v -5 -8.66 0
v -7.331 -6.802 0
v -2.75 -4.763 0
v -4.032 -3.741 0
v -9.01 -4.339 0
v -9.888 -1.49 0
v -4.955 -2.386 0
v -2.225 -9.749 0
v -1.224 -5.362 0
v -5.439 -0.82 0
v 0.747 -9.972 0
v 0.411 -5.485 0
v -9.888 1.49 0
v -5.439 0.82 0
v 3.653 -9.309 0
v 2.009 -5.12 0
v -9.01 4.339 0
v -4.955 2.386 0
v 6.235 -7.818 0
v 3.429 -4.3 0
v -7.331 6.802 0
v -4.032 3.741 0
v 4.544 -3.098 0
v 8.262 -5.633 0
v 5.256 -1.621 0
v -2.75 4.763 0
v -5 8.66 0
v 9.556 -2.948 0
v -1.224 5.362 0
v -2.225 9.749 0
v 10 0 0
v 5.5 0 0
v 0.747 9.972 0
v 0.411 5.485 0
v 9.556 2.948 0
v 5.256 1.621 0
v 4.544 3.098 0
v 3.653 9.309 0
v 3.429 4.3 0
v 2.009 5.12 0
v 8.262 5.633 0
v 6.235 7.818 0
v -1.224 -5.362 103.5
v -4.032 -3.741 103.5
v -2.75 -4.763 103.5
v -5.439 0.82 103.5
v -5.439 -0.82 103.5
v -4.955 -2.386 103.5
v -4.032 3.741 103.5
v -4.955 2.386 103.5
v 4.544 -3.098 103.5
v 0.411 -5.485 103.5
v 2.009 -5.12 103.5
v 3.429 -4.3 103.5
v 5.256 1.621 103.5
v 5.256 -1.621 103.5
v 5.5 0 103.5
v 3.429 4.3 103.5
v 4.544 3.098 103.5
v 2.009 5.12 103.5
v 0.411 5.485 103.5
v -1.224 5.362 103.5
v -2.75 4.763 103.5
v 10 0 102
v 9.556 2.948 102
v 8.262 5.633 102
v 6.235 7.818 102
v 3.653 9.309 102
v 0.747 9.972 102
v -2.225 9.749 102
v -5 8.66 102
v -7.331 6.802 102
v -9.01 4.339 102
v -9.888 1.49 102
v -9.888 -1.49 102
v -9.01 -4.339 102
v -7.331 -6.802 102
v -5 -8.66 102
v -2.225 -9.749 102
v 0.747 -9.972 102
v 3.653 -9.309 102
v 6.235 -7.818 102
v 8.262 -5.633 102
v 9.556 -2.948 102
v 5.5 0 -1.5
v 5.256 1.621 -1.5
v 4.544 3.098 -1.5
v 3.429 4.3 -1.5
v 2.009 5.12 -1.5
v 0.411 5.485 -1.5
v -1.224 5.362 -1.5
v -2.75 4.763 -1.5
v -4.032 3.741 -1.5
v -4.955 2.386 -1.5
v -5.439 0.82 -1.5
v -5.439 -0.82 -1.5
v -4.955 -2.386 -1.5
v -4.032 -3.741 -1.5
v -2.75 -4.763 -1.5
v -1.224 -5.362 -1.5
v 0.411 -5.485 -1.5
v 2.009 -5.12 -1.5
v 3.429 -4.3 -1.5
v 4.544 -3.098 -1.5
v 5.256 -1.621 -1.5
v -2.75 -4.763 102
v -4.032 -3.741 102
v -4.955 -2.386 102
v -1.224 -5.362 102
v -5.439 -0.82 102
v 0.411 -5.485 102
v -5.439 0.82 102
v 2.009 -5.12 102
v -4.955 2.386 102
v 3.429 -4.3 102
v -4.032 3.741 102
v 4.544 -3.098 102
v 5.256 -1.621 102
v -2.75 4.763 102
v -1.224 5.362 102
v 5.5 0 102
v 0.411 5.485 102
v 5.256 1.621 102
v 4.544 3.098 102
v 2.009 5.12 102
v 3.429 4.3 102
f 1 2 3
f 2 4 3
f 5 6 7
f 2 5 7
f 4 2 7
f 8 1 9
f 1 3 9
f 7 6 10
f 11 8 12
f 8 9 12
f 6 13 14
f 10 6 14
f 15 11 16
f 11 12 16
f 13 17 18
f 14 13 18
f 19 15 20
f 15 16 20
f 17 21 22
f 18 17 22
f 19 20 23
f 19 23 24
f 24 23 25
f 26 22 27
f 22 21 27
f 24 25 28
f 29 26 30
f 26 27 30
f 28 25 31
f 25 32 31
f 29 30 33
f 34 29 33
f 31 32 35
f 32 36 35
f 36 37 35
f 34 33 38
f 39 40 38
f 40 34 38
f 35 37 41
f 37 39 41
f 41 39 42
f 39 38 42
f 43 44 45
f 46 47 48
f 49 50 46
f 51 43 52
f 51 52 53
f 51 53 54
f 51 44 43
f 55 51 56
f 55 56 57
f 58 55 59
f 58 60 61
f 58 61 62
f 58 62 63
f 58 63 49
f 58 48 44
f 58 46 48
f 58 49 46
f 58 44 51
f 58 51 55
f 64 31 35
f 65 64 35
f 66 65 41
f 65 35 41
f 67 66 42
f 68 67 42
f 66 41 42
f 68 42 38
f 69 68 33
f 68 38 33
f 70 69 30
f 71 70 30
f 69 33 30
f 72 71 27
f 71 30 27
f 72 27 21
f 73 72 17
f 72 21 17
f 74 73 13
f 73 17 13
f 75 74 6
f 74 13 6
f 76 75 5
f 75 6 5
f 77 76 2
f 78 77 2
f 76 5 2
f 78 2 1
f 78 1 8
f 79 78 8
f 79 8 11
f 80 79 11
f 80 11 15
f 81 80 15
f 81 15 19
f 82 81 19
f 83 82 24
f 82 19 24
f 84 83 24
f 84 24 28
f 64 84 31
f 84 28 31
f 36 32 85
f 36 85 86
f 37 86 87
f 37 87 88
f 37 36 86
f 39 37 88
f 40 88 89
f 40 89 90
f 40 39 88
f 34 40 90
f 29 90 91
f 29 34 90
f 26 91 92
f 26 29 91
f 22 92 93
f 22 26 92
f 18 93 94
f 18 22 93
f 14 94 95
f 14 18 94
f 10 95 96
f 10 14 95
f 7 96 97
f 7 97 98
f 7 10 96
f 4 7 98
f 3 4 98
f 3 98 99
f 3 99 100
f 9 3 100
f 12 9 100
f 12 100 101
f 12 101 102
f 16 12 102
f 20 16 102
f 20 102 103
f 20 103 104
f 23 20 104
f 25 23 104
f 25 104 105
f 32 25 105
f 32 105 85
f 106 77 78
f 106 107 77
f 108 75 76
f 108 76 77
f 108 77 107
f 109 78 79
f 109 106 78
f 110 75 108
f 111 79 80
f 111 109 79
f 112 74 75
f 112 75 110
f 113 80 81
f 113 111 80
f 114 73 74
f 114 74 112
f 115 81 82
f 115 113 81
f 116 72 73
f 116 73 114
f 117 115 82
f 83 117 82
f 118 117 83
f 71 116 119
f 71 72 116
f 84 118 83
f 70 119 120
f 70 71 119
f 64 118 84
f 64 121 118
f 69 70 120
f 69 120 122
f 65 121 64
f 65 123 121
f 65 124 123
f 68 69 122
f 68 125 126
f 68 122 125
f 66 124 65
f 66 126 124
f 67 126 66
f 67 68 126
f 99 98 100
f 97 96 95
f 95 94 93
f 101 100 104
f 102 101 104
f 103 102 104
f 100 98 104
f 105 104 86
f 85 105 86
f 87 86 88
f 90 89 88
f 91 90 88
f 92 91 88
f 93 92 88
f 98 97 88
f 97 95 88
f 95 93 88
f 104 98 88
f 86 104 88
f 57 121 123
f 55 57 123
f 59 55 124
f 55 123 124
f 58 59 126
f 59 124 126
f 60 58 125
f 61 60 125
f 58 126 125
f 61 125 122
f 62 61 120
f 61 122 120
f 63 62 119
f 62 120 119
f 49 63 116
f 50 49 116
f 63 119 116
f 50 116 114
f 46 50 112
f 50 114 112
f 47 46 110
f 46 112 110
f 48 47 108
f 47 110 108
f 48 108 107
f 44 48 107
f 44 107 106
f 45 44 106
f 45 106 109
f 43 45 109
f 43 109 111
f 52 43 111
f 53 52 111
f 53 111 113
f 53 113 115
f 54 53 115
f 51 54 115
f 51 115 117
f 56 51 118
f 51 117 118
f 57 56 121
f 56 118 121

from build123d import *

# Parameters (mm, degrees)
CROQUIS1_R                   = 10
SALIENTE_EXTRUIR2_DEPTH      = 102
CROQUIS2_R                   = 5.5
SALIENTE_EXTRUIR3_DEPTH      = 1.5
SALIENTE_EXTRUIR3_DEPTH_BACK = 103.5


with BuildPart() as part:
    # Croquis1 → Saliente-Extruir2 (new body)
    with BuildSketch(Plane.XY):
        Circle(CROQUIS1_R)
    extrude(amount=SALIENTE_EXTRUIR2_DEPTH)

    # Croquis2 → Saliente-Extruir3 (add, two sides)
    with BuildSketch(Plane.XY.offset(102)) as saliente_extruir3_sk:
        Circle(CROQUIS2_R)
    extrude(amount=SALIENTE_EXTRUIR3_DEPTH)
    extrude(saliente_extruir3_sk.sketch, amount=-SALIENTE_EXTRUIR3_DEPTH_BACK)


solid = part.part
